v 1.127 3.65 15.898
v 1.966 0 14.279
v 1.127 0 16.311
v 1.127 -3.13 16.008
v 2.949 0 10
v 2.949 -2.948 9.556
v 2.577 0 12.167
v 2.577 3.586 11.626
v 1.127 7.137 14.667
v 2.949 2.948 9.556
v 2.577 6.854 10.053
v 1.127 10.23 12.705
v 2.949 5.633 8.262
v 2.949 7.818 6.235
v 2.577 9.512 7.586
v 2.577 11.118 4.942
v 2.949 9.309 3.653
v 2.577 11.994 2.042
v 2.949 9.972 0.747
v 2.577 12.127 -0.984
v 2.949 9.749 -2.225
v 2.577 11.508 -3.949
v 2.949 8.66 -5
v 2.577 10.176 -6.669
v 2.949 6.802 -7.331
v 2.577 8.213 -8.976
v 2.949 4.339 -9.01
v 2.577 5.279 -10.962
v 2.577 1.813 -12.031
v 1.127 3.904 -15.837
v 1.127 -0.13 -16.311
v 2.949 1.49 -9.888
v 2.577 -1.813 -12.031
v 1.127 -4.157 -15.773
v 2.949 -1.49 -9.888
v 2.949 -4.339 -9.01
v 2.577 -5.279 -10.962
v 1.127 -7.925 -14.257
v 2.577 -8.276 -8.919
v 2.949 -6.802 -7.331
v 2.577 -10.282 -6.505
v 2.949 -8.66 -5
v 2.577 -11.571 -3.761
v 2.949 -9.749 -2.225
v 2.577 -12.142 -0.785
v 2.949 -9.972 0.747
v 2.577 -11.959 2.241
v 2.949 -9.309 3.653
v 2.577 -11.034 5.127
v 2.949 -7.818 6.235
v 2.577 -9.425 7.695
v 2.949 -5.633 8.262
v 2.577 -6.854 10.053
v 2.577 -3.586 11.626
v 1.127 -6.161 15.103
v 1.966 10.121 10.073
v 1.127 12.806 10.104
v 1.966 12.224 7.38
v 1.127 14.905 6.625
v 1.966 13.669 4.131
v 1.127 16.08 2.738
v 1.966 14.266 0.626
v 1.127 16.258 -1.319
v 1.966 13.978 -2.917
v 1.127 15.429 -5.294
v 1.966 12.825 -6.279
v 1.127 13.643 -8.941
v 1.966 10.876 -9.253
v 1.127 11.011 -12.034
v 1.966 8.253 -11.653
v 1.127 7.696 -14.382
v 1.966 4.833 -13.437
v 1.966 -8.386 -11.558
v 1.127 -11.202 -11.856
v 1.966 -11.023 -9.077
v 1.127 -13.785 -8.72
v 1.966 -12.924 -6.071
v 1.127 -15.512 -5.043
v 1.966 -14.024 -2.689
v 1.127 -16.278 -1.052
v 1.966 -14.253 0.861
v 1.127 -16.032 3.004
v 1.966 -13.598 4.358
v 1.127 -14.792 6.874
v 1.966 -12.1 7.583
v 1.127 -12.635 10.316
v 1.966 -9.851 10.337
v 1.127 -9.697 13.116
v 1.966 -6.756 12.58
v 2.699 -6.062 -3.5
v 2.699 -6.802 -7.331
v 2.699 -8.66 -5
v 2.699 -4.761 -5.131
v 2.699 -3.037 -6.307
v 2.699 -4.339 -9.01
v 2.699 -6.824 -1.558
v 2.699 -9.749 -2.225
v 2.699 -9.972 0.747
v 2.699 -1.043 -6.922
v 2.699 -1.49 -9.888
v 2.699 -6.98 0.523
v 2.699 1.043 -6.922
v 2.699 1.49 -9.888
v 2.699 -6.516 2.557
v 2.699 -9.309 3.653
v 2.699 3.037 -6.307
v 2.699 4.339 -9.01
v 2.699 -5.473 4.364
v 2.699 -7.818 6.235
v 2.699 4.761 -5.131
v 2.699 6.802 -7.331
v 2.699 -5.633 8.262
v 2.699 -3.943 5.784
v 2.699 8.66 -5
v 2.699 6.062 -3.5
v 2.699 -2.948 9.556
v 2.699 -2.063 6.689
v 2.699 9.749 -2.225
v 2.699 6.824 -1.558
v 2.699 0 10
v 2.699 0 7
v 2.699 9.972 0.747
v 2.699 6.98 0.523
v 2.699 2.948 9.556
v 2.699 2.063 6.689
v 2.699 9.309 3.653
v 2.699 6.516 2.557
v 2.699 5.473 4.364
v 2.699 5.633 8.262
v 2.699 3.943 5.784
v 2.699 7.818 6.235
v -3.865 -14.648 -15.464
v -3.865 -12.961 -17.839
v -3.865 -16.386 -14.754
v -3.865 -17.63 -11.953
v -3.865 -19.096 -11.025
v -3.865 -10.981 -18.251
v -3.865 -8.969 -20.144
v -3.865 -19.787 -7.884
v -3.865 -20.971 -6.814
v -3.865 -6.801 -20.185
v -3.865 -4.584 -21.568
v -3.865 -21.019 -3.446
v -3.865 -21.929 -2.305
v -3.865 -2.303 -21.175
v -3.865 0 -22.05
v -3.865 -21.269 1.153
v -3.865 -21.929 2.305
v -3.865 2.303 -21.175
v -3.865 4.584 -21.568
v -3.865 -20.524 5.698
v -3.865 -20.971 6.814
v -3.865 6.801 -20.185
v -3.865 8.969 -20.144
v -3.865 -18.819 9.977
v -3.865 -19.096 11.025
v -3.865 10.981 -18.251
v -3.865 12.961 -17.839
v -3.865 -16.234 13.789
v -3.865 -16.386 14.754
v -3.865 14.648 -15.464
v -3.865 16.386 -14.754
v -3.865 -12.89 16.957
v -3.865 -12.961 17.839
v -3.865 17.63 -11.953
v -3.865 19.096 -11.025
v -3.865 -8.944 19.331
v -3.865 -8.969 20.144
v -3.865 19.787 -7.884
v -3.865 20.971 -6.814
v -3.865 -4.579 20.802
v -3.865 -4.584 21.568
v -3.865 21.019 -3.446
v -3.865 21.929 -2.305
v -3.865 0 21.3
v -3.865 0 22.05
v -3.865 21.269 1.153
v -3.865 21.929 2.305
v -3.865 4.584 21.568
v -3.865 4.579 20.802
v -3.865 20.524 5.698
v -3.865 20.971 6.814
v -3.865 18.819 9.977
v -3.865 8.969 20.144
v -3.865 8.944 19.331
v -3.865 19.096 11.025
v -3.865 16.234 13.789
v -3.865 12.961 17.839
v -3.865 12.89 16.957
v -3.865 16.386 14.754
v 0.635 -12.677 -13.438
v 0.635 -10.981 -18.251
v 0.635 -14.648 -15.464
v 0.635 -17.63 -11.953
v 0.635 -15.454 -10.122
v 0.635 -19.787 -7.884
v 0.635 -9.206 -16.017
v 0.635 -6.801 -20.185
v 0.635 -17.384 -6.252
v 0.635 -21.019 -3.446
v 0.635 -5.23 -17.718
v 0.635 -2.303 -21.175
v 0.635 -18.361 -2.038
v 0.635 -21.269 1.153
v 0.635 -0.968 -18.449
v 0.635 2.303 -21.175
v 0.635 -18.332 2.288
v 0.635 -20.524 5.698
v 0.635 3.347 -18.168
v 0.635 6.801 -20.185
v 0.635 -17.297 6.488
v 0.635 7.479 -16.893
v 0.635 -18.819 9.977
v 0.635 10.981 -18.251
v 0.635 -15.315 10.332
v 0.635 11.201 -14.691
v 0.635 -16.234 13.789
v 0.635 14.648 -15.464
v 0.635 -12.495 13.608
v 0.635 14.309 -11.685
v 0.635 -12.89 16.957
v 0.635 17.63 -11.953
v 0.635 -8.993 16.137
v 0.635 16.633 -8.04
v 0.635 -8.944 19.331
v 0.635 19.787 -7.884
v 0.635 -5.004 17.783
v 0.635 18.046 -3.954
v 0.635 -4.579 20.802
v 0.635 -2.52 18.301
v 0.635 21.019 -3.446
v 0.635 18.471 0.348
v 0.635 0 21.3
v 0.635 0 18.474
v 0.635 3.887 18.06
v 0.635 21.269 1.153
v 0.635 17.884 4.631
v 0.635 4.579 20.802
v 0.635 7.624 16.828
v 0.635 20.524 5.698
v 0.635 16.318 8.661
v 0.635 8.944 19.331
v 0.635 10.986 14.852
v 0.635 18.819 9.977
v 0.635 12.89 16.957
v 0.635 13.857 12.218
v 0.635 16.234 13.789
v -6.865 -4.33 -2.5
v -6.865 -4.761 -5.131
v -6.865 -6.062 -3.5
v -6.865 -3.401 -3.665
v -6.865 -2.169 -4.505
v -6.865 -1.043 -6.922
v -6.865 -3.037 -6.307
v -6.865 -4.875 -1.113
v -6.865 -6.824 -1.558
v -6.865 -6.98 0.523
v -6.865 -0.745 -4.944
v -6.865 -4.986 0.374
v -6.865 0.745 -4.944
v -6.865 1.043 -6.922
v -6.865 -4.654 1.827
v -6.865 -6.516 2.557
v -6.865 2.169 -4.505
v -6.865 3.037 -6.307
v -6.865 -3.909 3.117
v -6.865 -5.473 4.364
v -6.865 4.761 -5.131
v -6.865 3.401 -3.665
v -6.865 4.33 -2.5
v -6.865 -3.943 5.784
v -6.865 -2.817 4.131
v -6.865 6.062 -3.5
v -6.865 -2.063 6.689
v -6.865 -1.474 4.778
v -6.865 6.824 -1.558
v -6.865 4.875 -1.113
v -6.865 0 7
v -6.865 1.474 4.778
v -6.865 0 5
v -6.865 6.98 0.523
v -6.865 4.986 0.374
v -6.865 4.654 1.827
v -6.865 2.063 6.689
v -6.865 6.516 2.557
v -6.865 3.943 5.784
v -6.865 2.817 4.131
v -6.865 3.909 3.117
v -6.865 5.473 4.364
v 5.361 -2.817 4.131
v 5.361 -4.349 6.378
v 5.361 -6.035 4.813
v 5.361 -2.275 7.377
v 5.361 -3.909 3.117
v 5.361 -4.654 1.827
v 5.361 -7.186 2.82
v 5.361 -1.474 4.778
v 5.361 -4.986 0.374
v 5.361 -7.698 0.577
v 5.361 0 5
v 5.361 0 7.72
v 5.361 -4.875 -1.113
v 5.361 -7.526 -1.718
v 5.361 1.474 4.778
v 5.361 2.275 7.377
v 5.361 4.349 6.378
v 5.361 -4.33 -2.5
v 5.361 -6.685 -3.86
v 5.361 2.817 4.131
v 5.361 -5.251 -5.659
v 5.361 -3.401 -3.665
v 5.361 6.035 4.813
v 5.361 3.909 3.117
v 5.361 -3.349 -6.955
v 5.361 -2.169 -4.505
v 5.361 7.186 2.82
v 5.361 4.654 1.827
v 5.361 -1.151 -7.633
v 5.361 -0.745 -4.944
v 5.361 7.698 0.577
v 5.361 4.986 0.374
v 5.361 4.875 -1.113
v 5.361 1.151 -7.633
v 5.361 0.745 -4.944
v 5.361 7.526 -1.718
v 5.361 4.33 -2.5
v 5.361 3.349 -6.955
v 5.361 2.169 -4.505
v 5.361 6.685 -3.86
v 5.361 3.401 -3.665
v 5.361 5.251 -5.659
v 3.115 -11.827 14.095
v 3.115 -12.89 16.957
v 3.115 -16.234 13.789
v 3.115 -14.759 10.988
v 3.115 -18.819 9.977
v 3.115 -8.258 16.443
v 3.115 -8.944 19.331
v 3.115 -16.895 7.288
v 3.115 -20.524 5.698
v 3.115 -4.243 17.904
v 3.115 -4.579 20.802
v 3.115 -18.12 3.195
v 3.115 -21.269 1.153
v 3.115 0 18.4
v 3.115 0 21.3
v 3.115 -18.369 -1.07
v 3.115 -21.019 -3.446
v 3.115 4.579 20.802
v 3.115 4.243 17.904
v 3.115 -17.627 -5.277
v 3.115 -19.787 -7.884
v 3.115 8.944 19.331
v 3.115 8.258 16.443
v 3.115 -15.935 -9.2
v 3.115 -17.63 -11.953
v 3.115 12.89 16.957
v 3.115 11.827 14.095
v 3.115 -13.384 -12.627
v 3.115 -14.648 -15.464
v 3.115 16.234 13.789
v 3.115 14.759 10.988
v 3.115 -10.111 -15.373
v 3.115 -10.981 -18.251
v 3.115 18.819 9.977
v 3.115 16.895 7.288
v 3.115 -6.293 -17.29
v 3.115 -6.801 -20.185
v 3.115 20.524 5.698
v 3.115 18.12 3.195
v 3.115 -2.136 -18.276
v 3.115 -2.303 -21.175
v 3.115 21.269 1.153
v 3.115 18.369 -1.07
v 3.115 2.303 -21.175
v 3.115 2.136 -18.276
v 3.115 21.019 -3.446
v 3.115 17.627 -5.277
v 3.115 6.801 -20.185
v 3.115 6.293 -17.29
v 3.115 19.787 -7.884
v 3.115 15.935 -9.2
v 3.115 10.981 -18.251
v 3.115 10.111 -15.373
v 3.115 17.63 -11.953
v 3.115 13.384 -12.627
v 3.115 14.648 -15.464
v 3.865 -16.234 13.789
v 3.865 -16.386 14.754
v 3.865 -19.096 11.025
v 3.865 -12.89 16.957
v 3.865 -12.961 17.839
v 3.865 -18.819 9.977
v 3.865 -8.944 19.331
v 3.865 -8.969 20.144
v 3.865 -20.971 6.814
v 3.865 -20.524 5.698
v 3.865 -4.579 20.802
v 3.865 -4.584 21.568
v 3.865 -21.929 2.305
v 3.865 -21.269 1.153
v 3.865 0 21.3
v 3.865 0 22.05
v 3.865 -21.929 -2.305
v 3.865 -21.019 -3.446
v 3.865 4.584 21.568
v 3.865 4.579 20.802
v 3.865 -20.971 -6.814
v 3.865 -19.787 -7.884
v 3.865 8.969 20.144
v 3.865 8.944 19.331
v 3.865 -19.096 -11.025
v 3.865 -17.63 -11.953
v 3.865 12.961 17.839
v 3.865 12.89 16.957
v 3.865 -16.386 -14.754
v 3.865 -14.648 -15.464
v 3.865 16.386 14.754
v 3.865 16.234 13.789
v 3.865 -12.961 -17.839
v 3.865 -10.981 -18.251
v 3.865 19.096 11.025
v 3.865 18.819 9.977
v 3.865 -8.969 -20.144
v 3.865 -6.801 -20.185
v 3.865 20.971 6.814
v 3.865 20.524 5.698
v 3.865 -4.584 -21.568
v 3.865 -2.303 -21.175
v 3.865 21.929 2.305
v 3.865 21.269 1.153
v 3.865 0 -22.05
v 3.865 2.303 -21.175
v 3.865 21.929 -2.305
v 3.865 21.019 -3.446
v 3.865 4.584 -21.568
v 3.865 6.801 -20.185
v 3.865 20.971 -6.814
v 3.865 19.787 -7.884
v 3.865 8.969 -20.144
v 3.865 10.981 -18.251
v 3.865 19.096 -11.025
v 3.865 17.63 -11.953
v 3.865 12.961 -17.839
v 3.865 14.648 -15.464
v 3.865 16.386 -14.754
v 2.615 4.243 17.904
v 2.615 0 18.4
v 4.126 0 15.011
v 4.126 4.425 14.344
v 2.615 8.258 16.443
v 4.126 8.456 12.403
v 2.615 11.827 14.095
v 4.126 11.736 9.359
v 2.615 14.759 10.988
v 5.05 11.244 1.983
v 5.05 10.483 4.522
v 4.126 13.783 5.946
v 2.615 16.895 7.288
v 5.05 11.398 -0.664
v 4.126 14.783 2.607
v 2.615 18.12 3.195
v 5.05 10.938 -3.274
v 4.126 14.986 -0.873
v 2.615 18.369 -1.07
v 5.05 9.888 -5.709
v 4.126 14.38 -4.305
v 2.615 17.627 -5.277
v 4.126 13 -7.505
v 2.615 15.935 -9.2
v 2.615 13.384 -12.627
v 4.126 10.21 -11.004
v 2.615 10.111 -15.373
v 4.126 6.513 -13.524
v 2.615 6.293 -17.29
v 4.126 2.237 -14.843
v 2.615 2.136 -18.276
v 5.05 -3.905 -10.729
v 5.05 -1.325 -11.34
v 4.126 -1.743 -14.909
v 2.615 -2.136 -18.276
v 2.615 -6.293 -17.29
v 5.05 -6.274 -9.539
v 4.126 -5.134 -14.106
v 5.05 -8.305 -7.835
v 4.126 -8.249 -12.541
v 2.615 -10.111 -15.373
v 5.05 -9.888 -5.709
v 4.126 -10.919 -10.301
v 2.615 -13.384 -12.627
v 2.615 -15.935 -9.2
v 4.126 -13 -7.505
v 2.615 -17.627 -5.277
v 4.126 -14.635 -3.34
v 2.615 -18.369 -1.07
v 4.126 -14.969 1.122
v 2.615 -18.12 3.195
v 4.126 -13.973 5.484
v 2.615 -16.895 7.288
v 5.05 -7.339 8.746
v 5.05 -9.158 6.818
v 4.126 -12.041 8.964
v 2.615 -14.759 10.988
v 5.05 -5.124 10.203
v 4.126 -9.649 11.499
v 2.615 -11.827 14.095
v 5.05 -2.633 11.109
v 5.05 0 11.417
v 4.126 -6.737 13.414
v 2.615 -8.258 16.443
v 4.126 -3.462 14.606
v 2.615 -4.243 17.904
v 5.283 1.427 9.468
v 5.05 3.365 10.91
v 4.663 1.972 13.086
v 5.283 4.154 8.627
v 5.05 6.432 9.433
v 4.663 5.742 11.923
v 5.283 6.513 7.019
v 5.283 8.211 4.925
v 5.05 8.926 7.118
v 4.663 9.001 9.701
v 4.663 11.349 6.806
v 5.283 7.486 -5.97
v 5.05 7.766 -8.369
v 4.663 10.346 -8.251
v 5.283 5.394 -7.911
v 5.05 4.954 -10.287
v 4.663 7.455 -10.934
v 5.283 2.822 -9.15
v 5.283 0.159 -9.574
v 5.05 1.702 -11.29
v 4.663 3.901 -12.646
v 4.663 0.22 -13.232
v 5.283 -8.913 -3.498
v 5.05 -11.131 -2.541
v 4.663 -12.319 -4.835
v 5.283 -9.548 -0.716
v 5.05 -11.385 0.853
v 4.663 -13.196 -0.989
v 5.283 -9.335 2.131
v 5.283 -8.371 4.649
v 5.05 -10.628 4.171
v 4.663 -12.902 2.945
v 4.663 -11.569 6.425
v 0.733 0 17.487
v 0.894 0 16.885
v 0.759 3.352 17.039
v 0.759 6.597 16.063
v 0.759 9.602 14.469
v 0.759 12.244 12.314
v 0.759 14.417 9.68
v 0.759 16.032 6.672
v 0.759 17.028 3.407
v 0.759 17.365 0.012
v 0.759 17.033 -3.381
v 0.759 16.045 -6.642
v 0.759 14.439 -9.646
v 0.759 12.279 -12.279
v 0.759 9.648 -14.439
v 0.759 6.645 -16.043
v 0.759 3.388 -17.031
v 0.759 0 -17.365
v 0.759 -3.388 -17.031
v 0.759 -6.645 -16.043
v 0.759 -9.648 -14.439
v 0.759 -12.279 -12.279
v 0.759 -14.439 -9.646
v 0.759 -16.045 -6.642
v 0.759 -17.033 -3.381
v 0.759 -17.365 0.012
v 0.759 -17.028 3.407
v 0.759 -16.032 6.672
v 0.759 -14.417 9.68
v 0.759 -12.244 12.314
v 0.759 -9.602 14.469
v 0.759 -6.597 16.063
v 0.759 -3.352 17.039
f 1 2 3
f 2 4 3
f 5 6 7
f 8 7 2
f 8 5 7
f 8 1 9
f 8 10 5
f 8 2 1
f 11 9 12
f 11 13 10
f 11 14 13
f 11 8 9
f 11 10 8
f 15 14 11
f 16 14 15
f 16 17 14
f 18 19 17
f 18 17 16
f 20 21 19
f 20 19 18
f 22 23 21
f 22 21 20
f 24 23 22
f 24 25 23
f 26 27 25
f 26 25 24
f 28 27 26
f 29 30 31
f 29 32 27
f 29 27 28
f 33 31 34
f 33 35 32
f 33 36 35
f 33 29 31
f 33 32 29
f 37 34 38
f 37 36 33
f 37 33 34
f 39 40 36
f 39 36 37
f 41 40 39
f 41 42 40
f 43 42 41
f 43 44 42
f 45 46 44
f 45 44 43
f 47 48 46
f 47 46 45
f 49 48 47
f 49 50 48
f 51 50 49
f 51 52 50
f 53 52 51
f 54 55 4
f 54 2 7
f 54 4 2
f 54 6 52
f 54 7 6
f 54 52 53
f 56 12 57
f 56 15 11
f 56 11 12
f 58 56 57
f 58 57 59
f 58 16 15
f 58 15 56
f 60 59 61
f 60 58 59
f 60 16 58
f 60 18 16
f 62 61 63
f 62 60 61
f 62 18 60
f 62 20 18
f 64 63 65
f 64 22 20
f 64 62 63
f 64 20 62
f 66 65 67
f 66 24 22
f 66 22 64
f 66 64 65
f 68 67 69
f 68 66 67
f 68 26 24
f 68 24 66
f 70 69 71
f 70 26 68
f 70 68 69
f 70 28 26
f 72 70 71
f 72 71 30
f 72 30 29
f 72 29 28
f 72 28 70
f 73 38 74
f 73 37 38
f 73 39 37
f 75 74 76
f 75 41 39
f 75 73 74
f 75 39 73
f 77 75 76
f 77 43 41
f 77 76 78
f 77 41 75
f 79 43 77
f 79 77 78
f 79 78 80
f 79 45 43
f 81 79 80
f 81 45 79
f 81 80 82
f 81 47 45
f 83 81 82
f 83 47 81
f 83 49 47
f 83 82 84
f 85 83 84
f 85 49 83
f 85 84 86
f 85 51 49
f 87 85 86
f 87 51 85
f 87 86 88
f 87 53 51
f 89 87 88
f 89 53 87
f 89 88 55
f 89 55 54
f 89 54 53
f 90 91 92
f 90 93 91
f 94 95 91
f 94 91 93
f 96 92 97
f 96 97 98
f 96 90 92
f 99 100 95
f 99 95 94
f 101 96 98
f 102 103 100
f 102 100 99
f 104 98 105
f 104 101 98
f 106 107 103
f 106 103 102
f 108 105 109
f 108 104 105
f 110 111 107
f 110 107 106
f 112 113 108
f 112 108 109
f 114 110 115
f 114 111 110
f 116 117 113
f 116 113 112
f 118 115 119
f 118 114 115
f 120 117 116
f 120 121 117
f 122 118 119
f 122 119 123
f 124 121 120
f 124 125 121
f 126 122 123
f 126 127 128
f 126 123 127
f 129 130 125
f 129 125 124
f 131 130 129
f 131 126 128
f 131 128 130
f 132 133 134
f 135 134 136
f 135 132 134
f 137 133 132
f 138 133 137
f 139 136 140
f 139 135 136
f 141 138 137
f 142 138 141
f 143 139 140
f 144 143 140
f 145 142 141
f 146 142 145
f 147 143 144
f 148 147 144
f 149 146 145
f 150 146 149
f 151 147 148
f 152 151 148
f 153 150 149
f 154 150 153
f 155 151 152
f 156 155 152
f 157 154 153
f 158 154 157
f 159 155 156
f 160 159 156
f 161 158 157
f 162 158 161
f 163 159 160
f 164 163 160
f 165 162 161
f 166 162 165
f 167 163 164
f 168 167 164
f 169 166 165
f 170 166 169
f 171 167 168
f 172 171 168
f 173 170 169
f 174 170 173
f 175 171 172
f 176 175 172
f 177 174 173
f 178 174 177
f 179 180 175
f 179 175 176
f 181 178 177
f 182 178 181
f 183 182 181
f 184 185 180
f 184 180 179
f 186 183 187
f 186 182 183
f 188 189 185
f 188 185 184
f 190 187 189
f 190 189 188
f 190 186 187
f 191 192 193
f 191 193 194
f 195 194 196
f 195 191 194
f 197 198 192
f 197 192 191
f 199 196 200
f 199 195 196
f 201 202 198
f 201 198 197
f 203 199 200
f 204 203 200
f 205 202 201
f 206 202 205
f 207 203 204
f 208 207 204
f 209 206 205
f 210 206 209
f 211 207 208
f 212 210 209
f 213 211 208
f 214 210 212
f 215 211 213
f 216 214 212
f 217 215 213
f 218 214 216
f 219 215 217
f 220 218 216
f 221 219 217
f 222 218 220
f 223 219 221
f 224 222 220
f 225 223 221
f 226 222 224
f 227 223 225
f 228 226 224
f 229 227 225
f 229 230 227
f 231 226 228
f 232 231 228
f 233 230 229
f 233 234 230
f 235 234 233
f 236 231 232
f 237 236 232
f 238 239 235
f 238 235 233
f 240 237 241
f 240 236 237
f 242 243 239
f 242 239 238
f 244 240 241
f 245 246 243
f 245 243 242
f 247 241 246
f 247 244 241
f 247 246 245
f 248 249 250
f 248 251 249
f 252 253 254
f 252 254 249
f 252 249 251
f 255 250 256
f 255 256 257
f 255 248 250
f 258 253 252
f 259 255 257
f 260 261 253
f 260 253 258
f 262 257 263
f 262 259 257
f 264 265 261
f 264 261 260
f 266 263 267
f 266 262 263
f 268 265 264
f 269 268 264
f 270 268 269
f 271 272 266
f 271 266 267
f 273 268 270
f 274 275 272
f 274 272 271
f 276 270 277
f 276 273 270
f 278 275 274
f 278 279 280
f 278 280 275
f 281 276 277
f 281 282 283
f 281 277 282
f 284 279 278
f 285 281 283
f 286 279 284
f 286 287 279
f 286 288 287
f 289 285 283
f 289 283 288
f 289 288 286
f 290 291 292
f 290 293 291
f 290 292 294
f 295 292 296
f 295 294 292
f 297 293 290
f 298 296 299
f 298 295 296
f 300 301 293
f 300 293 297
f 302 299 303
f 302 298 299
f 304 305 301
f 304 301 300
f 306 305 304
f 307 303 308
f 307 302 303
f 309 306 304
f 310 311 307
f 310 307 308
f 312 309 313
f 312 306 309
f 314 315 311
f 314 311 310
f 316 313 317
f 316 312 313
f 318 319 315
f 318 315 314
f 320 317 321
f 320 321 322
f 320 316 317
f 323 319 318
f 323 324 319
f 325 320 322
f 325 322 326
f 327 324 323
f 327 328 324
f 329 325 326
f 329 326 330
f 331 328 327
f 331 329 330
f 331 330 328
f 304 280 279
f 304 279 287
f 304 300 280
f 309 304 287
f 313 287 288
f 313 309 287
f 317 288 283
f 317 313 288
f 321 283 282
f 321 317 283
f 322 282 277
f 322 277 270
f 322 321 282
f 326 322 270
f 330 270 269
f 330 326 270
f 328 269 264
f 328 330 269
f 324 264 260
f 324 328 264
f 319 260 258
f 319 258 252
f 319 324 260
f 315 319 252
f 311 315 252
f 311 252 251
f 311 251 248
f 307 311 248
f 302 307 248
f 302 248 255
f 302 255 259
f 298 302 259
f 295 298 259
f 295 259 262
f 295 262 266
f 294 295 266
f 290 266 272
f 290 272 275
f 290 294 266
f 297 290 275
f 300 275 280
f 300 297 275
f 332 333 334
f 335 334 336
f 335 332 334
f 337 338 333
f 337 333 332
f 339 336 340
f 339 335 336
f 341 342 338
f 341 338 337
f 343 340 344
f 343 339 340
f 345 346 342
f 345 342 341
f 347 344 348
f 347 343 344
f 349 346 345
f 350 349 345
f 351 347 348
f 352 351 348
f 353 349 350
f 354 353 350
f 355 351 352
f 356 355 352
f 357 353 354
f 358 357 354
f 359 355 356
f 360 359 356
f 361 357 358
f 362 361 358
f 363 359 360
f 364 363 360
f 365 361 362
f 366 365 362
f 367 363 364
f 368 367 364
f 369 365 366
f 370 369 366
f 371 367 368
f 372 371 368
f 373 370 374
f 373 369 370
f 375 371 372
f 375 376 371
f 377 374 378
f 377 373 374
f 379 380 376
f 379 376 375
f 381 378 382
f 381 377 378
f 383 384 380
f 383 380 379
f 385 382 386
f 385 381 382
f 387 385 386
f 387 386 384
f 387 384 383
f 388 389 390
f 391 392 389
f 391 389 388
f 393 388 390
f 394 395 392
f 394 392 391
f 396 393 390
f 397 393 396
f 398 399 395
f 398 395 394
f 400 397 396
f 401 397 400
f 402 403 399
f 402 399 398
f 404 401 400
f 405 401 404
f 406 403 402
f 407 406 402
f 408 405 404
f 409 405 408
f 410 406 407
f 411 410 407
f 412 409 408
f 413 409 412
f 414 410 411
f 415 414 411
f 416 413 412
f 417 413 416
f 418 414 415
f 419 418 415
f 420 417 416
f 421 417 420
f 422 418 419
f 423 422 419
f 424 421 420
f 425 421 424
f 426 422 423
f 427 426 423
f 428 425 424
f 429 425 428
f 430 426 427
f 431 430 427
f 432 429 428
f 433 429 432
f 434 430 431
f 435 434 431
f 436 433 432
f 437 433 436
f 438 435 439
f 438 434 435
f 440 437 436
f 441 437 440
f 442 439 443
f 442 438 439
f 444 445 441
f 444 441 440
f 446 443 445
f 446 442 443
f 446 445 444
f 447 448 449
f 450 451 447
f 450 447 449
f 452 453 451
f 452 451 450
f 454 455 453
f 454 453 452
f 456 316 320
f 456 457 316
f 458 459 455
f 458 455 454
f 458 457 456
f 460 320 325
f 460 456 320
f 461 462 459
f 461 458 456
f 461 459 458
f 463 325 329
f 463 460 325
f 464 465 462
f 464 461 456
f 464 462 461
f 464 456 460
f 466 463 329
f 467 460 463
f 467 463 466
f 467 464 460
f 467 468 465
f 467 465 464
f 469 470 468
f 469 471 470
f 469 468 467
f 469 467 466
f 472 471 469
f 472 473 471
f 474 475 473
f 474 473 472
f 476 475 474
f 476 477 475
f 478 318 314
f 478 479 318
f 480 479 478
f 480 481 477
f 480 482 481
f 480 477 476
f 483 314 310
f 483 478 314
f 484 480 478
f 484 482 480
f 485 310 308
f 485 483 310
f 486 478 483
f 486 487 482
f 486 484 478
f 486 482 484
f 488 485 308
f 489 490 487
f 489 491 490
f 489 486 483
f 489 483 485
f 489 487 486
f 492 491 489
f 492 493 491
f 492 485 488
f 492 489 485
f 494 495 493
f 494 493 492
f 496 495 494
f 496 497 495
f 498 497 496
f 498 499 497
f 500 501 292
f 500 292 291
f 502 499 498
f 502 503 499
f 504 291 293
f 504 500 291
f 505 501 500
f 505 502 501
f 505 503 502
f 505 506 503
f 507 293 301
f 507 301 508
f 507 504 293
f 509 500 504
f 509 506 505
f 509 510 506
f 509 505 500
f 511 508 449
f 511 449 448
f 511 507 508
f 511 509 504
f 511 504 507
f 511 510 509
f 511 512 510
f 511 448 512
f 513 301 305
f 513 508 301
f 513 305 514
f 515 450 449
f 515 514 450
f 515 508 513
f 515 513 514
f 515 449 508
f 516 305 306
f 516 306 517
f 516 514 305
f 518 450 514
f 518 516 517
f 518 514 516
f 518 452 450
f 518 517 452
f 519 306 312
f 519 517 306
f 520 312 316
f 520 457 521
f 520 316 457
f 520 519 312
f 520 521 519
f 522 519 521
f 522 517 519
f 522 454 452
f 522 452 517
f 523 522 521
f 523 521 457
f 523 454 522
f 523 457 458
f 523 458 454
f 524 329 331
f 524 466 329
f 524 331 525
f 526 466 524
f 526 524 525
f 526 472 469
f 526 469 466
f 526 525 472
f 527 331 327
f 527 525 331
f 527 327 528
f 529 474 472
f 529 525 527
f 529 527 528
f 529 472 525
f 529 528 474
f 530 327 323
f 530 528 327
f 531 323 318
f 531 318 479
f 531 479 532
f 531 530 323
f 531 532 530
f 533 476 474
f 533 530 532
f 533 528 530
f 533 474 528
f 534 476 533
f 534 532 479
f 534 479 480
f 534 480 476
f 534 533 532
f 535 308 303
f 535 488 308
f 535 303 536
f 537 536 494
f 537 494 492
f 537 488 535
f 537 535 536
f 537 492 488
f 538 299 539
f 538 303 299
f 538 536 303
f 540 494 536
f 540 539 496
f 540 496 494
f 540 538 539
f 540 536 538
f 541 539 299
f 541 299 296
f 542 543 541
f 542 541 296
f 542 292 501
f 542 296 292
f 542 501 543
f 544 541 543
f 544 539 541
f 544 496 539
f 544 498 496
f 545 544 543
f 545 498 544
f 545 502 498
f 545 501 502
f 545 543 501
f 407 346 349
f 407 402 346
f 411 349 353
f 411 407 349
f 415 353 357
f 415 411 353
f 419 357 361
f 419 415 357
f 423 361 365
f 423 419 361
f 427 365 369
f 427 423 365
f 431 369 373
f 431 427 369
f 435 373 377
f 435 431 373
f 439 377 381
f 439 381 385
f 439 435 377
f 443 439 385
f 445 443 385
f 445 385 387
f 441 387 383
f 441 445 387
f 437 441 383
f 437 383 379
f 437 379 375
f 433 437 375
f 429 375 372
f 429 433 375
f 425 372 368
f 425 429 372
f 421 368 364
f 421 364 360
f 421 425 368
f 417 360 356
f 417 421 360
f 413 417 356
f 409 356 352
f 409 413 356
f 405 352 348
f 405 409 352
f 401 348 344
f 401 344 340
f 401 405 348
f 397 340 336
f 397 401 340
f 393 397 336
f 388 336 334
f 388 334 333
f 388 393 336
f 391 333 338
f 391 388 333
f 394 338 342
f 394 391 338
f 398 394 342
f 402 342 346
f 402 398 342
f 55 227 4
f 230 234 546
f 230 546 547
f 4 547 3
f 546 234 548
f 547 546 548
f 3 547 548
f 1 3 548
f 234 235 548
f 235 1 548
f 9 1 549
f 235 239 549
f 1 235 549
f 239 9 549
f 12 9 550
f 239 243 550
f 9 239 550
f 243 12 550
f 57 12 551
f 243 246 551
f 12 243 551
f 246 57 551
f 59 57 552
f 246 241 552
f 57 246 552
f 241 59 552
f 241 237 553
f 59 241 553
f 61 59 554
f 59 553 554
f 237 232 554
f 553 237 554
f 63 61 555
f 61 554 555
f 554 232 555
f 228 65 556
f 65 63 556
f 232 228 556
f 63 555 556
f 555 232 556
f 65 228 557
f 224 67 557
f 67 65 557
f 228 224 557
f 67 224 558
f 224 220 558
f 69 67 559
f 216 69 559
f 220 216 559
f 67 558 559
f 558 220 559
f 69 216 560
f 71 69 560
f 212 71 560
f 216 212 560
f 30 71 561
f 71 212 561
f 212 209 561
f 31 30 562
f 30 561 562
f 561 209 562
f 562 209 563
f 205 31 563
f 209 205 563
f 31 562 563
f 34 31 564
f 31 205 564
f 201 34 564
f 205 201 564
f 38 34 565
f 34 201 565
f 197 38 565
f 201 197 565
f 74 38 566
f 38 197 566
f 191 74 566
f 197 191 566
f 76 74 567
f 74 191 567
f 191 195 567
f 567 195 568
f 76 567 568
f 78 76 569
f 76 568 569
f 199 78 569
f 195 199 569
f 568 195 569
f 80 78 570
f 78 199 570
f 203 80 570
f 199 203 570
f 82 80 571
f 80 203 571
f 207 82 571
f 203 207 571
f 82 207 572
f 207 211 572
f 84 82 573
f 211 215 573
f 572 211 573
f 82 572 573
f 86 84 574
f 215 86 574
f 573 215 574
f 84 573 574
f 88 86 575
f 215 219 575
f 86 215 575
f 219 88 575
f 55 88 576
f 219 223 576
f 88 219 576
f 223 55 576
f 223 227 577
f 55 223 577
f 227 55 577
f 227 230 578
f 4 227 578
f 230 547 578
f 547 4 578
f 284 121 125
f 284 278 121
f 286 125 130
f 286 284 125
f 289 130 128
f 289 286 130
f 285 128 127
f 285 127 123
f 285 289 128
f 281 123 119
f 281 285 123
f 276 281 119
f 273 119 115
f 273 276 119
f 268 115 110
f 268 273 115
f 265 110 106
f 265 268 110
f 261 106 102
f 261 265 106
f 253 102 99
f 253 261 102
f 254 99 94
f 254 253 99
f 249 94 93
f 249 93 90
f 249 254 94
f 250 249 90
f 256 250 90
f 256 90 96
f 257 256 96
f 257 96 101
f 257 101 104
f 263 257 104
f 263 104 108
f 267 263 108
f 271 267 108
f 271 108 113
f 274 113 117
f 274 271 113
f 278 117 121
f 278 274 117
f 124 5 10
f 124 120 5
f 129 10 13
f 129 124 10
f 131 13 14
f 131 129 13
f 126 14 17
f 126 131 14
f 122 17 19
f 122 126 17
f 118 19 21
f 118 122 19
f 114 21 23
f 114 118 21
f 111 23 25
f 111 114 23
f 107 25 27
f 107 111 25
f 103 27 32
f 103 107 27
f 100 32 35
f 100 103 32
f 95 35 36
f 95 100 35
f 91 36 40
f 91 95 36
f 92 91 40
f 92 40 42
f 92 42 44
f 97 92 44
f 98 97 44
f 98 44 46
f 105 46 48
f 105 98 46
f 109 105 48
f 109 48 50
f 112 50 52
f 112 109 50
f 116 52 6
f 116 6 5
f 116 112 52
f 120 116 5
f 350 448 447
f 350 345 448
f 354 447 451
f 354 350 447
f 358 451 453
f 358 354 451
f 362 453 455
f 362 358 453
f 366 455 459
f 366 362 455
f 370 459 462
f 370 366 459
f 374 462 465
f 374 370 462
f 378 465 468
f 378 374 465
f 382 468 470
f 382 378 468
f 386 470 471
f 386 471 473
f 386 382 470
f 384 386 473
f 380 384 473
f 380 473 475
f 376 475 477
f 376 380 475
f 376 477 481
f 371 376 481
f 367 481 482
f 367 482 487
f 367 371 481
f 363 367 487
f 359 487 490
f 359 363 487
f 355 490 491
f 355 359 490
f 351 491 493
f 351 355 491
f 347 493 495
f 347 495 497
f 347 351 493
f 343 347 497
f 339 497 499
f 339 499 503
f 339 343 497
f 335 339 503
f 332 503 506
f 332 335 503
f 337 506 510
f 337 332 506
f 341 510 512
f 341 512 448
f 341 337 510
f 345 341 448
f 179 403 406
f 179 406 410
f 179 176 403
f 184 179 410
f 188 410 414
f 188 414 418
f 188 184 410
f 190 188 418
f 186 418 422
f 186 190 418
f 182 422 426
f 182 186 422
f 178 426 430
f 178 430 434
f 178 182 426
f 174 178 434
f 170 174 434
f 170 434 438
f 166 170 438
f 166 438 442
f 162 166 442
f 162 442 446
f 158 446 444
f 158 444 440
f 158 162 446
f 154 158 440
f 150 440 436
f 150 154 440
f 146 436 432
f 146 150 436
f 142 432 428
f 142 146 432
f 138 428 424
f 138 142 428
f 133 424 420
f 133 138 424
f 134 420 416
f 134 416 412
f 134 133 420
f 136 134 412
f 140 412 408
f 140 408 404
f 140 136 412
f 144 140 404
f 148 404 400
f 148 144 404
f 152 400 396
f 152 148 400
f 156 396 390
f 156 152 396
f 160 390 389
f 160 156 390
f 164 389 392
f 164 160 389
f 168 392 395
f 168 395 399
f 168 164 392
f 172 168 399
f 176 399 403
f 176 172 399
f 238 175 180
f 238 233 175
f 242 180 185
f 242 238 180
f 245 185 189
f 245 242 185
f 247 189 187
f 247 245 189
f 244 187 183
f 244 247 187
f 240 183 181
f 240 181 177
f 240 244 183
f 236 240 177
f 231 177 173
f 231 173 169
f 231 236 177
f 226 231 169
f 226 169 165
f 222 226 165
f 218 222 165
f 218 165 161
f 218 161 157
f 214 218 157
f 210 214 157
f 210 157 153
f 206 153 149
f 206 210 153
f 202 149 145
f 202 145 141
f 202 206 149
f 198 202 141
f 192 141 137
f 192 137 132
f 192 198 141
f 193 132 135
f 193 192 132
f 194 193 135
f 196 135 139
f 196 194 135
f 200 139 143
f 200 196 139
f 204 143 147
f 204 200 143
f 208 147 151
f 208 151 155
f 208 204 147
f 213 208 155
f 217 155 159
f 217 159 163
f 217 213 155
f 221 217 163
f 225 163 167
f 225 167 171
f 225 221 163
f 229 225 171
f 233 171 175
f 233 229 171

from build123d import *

# Parameters (mm, degrees)
F2_R = 5


with BuildPart() as f1:
    # F0 (on Front) → F1 (revolve)
    with BuildSketch(Plane.XZ):
        with BuildLine():
            Line((3.865, 21.3), (3.865, 22.05))
            Line((3.865, 22.05), (-3.865, 22.05))
            Line((-3.865, 22.05), (-3.865, 21.3))
            Line((-3.865, 21.3), (0.634659, 21.3))
            Line((0.634659, 21.3), (0.634659, 17.269368))
            ThreePointArc((0.634659, 17.269368), (2.14433, 13.746856), (2.949481, 10))
            Line((2.949481, 10), (2.699481, 10))
            Line((2.699481, 10), (2.699481, 7))
            Line((2.699481, 7), (-6.865, 7))
            Line((-6.865, 7), (-6.865, 5))
            Line((-6.865, 5), (5.36081, 5))
            Line((5.36081, 5), (5.36081, 7.719591))
            ThreePointArc((5.36081, 7.719591), (4.663357, 13.233456), (2.614931, 18.399992))
            Line((2.614931, 18.399992), (3.115, 18.4))
            Line((3.115, 18.4), (3.115, 21.3))
            Line((3.115, 21.3), (3.865, 21.3))
        make_face()
    revolve(axis=Axis((-0.507669, 0, 0), (-1, 0, 0)))

    # F2
    f2_edges = [f1.edges().sort_by_distance(p)[0] for p in [
        (0.634659, 0, -17.269368),
    ]]
    fillet(f2_edges, radius=F2_R)


solid = f1.part
